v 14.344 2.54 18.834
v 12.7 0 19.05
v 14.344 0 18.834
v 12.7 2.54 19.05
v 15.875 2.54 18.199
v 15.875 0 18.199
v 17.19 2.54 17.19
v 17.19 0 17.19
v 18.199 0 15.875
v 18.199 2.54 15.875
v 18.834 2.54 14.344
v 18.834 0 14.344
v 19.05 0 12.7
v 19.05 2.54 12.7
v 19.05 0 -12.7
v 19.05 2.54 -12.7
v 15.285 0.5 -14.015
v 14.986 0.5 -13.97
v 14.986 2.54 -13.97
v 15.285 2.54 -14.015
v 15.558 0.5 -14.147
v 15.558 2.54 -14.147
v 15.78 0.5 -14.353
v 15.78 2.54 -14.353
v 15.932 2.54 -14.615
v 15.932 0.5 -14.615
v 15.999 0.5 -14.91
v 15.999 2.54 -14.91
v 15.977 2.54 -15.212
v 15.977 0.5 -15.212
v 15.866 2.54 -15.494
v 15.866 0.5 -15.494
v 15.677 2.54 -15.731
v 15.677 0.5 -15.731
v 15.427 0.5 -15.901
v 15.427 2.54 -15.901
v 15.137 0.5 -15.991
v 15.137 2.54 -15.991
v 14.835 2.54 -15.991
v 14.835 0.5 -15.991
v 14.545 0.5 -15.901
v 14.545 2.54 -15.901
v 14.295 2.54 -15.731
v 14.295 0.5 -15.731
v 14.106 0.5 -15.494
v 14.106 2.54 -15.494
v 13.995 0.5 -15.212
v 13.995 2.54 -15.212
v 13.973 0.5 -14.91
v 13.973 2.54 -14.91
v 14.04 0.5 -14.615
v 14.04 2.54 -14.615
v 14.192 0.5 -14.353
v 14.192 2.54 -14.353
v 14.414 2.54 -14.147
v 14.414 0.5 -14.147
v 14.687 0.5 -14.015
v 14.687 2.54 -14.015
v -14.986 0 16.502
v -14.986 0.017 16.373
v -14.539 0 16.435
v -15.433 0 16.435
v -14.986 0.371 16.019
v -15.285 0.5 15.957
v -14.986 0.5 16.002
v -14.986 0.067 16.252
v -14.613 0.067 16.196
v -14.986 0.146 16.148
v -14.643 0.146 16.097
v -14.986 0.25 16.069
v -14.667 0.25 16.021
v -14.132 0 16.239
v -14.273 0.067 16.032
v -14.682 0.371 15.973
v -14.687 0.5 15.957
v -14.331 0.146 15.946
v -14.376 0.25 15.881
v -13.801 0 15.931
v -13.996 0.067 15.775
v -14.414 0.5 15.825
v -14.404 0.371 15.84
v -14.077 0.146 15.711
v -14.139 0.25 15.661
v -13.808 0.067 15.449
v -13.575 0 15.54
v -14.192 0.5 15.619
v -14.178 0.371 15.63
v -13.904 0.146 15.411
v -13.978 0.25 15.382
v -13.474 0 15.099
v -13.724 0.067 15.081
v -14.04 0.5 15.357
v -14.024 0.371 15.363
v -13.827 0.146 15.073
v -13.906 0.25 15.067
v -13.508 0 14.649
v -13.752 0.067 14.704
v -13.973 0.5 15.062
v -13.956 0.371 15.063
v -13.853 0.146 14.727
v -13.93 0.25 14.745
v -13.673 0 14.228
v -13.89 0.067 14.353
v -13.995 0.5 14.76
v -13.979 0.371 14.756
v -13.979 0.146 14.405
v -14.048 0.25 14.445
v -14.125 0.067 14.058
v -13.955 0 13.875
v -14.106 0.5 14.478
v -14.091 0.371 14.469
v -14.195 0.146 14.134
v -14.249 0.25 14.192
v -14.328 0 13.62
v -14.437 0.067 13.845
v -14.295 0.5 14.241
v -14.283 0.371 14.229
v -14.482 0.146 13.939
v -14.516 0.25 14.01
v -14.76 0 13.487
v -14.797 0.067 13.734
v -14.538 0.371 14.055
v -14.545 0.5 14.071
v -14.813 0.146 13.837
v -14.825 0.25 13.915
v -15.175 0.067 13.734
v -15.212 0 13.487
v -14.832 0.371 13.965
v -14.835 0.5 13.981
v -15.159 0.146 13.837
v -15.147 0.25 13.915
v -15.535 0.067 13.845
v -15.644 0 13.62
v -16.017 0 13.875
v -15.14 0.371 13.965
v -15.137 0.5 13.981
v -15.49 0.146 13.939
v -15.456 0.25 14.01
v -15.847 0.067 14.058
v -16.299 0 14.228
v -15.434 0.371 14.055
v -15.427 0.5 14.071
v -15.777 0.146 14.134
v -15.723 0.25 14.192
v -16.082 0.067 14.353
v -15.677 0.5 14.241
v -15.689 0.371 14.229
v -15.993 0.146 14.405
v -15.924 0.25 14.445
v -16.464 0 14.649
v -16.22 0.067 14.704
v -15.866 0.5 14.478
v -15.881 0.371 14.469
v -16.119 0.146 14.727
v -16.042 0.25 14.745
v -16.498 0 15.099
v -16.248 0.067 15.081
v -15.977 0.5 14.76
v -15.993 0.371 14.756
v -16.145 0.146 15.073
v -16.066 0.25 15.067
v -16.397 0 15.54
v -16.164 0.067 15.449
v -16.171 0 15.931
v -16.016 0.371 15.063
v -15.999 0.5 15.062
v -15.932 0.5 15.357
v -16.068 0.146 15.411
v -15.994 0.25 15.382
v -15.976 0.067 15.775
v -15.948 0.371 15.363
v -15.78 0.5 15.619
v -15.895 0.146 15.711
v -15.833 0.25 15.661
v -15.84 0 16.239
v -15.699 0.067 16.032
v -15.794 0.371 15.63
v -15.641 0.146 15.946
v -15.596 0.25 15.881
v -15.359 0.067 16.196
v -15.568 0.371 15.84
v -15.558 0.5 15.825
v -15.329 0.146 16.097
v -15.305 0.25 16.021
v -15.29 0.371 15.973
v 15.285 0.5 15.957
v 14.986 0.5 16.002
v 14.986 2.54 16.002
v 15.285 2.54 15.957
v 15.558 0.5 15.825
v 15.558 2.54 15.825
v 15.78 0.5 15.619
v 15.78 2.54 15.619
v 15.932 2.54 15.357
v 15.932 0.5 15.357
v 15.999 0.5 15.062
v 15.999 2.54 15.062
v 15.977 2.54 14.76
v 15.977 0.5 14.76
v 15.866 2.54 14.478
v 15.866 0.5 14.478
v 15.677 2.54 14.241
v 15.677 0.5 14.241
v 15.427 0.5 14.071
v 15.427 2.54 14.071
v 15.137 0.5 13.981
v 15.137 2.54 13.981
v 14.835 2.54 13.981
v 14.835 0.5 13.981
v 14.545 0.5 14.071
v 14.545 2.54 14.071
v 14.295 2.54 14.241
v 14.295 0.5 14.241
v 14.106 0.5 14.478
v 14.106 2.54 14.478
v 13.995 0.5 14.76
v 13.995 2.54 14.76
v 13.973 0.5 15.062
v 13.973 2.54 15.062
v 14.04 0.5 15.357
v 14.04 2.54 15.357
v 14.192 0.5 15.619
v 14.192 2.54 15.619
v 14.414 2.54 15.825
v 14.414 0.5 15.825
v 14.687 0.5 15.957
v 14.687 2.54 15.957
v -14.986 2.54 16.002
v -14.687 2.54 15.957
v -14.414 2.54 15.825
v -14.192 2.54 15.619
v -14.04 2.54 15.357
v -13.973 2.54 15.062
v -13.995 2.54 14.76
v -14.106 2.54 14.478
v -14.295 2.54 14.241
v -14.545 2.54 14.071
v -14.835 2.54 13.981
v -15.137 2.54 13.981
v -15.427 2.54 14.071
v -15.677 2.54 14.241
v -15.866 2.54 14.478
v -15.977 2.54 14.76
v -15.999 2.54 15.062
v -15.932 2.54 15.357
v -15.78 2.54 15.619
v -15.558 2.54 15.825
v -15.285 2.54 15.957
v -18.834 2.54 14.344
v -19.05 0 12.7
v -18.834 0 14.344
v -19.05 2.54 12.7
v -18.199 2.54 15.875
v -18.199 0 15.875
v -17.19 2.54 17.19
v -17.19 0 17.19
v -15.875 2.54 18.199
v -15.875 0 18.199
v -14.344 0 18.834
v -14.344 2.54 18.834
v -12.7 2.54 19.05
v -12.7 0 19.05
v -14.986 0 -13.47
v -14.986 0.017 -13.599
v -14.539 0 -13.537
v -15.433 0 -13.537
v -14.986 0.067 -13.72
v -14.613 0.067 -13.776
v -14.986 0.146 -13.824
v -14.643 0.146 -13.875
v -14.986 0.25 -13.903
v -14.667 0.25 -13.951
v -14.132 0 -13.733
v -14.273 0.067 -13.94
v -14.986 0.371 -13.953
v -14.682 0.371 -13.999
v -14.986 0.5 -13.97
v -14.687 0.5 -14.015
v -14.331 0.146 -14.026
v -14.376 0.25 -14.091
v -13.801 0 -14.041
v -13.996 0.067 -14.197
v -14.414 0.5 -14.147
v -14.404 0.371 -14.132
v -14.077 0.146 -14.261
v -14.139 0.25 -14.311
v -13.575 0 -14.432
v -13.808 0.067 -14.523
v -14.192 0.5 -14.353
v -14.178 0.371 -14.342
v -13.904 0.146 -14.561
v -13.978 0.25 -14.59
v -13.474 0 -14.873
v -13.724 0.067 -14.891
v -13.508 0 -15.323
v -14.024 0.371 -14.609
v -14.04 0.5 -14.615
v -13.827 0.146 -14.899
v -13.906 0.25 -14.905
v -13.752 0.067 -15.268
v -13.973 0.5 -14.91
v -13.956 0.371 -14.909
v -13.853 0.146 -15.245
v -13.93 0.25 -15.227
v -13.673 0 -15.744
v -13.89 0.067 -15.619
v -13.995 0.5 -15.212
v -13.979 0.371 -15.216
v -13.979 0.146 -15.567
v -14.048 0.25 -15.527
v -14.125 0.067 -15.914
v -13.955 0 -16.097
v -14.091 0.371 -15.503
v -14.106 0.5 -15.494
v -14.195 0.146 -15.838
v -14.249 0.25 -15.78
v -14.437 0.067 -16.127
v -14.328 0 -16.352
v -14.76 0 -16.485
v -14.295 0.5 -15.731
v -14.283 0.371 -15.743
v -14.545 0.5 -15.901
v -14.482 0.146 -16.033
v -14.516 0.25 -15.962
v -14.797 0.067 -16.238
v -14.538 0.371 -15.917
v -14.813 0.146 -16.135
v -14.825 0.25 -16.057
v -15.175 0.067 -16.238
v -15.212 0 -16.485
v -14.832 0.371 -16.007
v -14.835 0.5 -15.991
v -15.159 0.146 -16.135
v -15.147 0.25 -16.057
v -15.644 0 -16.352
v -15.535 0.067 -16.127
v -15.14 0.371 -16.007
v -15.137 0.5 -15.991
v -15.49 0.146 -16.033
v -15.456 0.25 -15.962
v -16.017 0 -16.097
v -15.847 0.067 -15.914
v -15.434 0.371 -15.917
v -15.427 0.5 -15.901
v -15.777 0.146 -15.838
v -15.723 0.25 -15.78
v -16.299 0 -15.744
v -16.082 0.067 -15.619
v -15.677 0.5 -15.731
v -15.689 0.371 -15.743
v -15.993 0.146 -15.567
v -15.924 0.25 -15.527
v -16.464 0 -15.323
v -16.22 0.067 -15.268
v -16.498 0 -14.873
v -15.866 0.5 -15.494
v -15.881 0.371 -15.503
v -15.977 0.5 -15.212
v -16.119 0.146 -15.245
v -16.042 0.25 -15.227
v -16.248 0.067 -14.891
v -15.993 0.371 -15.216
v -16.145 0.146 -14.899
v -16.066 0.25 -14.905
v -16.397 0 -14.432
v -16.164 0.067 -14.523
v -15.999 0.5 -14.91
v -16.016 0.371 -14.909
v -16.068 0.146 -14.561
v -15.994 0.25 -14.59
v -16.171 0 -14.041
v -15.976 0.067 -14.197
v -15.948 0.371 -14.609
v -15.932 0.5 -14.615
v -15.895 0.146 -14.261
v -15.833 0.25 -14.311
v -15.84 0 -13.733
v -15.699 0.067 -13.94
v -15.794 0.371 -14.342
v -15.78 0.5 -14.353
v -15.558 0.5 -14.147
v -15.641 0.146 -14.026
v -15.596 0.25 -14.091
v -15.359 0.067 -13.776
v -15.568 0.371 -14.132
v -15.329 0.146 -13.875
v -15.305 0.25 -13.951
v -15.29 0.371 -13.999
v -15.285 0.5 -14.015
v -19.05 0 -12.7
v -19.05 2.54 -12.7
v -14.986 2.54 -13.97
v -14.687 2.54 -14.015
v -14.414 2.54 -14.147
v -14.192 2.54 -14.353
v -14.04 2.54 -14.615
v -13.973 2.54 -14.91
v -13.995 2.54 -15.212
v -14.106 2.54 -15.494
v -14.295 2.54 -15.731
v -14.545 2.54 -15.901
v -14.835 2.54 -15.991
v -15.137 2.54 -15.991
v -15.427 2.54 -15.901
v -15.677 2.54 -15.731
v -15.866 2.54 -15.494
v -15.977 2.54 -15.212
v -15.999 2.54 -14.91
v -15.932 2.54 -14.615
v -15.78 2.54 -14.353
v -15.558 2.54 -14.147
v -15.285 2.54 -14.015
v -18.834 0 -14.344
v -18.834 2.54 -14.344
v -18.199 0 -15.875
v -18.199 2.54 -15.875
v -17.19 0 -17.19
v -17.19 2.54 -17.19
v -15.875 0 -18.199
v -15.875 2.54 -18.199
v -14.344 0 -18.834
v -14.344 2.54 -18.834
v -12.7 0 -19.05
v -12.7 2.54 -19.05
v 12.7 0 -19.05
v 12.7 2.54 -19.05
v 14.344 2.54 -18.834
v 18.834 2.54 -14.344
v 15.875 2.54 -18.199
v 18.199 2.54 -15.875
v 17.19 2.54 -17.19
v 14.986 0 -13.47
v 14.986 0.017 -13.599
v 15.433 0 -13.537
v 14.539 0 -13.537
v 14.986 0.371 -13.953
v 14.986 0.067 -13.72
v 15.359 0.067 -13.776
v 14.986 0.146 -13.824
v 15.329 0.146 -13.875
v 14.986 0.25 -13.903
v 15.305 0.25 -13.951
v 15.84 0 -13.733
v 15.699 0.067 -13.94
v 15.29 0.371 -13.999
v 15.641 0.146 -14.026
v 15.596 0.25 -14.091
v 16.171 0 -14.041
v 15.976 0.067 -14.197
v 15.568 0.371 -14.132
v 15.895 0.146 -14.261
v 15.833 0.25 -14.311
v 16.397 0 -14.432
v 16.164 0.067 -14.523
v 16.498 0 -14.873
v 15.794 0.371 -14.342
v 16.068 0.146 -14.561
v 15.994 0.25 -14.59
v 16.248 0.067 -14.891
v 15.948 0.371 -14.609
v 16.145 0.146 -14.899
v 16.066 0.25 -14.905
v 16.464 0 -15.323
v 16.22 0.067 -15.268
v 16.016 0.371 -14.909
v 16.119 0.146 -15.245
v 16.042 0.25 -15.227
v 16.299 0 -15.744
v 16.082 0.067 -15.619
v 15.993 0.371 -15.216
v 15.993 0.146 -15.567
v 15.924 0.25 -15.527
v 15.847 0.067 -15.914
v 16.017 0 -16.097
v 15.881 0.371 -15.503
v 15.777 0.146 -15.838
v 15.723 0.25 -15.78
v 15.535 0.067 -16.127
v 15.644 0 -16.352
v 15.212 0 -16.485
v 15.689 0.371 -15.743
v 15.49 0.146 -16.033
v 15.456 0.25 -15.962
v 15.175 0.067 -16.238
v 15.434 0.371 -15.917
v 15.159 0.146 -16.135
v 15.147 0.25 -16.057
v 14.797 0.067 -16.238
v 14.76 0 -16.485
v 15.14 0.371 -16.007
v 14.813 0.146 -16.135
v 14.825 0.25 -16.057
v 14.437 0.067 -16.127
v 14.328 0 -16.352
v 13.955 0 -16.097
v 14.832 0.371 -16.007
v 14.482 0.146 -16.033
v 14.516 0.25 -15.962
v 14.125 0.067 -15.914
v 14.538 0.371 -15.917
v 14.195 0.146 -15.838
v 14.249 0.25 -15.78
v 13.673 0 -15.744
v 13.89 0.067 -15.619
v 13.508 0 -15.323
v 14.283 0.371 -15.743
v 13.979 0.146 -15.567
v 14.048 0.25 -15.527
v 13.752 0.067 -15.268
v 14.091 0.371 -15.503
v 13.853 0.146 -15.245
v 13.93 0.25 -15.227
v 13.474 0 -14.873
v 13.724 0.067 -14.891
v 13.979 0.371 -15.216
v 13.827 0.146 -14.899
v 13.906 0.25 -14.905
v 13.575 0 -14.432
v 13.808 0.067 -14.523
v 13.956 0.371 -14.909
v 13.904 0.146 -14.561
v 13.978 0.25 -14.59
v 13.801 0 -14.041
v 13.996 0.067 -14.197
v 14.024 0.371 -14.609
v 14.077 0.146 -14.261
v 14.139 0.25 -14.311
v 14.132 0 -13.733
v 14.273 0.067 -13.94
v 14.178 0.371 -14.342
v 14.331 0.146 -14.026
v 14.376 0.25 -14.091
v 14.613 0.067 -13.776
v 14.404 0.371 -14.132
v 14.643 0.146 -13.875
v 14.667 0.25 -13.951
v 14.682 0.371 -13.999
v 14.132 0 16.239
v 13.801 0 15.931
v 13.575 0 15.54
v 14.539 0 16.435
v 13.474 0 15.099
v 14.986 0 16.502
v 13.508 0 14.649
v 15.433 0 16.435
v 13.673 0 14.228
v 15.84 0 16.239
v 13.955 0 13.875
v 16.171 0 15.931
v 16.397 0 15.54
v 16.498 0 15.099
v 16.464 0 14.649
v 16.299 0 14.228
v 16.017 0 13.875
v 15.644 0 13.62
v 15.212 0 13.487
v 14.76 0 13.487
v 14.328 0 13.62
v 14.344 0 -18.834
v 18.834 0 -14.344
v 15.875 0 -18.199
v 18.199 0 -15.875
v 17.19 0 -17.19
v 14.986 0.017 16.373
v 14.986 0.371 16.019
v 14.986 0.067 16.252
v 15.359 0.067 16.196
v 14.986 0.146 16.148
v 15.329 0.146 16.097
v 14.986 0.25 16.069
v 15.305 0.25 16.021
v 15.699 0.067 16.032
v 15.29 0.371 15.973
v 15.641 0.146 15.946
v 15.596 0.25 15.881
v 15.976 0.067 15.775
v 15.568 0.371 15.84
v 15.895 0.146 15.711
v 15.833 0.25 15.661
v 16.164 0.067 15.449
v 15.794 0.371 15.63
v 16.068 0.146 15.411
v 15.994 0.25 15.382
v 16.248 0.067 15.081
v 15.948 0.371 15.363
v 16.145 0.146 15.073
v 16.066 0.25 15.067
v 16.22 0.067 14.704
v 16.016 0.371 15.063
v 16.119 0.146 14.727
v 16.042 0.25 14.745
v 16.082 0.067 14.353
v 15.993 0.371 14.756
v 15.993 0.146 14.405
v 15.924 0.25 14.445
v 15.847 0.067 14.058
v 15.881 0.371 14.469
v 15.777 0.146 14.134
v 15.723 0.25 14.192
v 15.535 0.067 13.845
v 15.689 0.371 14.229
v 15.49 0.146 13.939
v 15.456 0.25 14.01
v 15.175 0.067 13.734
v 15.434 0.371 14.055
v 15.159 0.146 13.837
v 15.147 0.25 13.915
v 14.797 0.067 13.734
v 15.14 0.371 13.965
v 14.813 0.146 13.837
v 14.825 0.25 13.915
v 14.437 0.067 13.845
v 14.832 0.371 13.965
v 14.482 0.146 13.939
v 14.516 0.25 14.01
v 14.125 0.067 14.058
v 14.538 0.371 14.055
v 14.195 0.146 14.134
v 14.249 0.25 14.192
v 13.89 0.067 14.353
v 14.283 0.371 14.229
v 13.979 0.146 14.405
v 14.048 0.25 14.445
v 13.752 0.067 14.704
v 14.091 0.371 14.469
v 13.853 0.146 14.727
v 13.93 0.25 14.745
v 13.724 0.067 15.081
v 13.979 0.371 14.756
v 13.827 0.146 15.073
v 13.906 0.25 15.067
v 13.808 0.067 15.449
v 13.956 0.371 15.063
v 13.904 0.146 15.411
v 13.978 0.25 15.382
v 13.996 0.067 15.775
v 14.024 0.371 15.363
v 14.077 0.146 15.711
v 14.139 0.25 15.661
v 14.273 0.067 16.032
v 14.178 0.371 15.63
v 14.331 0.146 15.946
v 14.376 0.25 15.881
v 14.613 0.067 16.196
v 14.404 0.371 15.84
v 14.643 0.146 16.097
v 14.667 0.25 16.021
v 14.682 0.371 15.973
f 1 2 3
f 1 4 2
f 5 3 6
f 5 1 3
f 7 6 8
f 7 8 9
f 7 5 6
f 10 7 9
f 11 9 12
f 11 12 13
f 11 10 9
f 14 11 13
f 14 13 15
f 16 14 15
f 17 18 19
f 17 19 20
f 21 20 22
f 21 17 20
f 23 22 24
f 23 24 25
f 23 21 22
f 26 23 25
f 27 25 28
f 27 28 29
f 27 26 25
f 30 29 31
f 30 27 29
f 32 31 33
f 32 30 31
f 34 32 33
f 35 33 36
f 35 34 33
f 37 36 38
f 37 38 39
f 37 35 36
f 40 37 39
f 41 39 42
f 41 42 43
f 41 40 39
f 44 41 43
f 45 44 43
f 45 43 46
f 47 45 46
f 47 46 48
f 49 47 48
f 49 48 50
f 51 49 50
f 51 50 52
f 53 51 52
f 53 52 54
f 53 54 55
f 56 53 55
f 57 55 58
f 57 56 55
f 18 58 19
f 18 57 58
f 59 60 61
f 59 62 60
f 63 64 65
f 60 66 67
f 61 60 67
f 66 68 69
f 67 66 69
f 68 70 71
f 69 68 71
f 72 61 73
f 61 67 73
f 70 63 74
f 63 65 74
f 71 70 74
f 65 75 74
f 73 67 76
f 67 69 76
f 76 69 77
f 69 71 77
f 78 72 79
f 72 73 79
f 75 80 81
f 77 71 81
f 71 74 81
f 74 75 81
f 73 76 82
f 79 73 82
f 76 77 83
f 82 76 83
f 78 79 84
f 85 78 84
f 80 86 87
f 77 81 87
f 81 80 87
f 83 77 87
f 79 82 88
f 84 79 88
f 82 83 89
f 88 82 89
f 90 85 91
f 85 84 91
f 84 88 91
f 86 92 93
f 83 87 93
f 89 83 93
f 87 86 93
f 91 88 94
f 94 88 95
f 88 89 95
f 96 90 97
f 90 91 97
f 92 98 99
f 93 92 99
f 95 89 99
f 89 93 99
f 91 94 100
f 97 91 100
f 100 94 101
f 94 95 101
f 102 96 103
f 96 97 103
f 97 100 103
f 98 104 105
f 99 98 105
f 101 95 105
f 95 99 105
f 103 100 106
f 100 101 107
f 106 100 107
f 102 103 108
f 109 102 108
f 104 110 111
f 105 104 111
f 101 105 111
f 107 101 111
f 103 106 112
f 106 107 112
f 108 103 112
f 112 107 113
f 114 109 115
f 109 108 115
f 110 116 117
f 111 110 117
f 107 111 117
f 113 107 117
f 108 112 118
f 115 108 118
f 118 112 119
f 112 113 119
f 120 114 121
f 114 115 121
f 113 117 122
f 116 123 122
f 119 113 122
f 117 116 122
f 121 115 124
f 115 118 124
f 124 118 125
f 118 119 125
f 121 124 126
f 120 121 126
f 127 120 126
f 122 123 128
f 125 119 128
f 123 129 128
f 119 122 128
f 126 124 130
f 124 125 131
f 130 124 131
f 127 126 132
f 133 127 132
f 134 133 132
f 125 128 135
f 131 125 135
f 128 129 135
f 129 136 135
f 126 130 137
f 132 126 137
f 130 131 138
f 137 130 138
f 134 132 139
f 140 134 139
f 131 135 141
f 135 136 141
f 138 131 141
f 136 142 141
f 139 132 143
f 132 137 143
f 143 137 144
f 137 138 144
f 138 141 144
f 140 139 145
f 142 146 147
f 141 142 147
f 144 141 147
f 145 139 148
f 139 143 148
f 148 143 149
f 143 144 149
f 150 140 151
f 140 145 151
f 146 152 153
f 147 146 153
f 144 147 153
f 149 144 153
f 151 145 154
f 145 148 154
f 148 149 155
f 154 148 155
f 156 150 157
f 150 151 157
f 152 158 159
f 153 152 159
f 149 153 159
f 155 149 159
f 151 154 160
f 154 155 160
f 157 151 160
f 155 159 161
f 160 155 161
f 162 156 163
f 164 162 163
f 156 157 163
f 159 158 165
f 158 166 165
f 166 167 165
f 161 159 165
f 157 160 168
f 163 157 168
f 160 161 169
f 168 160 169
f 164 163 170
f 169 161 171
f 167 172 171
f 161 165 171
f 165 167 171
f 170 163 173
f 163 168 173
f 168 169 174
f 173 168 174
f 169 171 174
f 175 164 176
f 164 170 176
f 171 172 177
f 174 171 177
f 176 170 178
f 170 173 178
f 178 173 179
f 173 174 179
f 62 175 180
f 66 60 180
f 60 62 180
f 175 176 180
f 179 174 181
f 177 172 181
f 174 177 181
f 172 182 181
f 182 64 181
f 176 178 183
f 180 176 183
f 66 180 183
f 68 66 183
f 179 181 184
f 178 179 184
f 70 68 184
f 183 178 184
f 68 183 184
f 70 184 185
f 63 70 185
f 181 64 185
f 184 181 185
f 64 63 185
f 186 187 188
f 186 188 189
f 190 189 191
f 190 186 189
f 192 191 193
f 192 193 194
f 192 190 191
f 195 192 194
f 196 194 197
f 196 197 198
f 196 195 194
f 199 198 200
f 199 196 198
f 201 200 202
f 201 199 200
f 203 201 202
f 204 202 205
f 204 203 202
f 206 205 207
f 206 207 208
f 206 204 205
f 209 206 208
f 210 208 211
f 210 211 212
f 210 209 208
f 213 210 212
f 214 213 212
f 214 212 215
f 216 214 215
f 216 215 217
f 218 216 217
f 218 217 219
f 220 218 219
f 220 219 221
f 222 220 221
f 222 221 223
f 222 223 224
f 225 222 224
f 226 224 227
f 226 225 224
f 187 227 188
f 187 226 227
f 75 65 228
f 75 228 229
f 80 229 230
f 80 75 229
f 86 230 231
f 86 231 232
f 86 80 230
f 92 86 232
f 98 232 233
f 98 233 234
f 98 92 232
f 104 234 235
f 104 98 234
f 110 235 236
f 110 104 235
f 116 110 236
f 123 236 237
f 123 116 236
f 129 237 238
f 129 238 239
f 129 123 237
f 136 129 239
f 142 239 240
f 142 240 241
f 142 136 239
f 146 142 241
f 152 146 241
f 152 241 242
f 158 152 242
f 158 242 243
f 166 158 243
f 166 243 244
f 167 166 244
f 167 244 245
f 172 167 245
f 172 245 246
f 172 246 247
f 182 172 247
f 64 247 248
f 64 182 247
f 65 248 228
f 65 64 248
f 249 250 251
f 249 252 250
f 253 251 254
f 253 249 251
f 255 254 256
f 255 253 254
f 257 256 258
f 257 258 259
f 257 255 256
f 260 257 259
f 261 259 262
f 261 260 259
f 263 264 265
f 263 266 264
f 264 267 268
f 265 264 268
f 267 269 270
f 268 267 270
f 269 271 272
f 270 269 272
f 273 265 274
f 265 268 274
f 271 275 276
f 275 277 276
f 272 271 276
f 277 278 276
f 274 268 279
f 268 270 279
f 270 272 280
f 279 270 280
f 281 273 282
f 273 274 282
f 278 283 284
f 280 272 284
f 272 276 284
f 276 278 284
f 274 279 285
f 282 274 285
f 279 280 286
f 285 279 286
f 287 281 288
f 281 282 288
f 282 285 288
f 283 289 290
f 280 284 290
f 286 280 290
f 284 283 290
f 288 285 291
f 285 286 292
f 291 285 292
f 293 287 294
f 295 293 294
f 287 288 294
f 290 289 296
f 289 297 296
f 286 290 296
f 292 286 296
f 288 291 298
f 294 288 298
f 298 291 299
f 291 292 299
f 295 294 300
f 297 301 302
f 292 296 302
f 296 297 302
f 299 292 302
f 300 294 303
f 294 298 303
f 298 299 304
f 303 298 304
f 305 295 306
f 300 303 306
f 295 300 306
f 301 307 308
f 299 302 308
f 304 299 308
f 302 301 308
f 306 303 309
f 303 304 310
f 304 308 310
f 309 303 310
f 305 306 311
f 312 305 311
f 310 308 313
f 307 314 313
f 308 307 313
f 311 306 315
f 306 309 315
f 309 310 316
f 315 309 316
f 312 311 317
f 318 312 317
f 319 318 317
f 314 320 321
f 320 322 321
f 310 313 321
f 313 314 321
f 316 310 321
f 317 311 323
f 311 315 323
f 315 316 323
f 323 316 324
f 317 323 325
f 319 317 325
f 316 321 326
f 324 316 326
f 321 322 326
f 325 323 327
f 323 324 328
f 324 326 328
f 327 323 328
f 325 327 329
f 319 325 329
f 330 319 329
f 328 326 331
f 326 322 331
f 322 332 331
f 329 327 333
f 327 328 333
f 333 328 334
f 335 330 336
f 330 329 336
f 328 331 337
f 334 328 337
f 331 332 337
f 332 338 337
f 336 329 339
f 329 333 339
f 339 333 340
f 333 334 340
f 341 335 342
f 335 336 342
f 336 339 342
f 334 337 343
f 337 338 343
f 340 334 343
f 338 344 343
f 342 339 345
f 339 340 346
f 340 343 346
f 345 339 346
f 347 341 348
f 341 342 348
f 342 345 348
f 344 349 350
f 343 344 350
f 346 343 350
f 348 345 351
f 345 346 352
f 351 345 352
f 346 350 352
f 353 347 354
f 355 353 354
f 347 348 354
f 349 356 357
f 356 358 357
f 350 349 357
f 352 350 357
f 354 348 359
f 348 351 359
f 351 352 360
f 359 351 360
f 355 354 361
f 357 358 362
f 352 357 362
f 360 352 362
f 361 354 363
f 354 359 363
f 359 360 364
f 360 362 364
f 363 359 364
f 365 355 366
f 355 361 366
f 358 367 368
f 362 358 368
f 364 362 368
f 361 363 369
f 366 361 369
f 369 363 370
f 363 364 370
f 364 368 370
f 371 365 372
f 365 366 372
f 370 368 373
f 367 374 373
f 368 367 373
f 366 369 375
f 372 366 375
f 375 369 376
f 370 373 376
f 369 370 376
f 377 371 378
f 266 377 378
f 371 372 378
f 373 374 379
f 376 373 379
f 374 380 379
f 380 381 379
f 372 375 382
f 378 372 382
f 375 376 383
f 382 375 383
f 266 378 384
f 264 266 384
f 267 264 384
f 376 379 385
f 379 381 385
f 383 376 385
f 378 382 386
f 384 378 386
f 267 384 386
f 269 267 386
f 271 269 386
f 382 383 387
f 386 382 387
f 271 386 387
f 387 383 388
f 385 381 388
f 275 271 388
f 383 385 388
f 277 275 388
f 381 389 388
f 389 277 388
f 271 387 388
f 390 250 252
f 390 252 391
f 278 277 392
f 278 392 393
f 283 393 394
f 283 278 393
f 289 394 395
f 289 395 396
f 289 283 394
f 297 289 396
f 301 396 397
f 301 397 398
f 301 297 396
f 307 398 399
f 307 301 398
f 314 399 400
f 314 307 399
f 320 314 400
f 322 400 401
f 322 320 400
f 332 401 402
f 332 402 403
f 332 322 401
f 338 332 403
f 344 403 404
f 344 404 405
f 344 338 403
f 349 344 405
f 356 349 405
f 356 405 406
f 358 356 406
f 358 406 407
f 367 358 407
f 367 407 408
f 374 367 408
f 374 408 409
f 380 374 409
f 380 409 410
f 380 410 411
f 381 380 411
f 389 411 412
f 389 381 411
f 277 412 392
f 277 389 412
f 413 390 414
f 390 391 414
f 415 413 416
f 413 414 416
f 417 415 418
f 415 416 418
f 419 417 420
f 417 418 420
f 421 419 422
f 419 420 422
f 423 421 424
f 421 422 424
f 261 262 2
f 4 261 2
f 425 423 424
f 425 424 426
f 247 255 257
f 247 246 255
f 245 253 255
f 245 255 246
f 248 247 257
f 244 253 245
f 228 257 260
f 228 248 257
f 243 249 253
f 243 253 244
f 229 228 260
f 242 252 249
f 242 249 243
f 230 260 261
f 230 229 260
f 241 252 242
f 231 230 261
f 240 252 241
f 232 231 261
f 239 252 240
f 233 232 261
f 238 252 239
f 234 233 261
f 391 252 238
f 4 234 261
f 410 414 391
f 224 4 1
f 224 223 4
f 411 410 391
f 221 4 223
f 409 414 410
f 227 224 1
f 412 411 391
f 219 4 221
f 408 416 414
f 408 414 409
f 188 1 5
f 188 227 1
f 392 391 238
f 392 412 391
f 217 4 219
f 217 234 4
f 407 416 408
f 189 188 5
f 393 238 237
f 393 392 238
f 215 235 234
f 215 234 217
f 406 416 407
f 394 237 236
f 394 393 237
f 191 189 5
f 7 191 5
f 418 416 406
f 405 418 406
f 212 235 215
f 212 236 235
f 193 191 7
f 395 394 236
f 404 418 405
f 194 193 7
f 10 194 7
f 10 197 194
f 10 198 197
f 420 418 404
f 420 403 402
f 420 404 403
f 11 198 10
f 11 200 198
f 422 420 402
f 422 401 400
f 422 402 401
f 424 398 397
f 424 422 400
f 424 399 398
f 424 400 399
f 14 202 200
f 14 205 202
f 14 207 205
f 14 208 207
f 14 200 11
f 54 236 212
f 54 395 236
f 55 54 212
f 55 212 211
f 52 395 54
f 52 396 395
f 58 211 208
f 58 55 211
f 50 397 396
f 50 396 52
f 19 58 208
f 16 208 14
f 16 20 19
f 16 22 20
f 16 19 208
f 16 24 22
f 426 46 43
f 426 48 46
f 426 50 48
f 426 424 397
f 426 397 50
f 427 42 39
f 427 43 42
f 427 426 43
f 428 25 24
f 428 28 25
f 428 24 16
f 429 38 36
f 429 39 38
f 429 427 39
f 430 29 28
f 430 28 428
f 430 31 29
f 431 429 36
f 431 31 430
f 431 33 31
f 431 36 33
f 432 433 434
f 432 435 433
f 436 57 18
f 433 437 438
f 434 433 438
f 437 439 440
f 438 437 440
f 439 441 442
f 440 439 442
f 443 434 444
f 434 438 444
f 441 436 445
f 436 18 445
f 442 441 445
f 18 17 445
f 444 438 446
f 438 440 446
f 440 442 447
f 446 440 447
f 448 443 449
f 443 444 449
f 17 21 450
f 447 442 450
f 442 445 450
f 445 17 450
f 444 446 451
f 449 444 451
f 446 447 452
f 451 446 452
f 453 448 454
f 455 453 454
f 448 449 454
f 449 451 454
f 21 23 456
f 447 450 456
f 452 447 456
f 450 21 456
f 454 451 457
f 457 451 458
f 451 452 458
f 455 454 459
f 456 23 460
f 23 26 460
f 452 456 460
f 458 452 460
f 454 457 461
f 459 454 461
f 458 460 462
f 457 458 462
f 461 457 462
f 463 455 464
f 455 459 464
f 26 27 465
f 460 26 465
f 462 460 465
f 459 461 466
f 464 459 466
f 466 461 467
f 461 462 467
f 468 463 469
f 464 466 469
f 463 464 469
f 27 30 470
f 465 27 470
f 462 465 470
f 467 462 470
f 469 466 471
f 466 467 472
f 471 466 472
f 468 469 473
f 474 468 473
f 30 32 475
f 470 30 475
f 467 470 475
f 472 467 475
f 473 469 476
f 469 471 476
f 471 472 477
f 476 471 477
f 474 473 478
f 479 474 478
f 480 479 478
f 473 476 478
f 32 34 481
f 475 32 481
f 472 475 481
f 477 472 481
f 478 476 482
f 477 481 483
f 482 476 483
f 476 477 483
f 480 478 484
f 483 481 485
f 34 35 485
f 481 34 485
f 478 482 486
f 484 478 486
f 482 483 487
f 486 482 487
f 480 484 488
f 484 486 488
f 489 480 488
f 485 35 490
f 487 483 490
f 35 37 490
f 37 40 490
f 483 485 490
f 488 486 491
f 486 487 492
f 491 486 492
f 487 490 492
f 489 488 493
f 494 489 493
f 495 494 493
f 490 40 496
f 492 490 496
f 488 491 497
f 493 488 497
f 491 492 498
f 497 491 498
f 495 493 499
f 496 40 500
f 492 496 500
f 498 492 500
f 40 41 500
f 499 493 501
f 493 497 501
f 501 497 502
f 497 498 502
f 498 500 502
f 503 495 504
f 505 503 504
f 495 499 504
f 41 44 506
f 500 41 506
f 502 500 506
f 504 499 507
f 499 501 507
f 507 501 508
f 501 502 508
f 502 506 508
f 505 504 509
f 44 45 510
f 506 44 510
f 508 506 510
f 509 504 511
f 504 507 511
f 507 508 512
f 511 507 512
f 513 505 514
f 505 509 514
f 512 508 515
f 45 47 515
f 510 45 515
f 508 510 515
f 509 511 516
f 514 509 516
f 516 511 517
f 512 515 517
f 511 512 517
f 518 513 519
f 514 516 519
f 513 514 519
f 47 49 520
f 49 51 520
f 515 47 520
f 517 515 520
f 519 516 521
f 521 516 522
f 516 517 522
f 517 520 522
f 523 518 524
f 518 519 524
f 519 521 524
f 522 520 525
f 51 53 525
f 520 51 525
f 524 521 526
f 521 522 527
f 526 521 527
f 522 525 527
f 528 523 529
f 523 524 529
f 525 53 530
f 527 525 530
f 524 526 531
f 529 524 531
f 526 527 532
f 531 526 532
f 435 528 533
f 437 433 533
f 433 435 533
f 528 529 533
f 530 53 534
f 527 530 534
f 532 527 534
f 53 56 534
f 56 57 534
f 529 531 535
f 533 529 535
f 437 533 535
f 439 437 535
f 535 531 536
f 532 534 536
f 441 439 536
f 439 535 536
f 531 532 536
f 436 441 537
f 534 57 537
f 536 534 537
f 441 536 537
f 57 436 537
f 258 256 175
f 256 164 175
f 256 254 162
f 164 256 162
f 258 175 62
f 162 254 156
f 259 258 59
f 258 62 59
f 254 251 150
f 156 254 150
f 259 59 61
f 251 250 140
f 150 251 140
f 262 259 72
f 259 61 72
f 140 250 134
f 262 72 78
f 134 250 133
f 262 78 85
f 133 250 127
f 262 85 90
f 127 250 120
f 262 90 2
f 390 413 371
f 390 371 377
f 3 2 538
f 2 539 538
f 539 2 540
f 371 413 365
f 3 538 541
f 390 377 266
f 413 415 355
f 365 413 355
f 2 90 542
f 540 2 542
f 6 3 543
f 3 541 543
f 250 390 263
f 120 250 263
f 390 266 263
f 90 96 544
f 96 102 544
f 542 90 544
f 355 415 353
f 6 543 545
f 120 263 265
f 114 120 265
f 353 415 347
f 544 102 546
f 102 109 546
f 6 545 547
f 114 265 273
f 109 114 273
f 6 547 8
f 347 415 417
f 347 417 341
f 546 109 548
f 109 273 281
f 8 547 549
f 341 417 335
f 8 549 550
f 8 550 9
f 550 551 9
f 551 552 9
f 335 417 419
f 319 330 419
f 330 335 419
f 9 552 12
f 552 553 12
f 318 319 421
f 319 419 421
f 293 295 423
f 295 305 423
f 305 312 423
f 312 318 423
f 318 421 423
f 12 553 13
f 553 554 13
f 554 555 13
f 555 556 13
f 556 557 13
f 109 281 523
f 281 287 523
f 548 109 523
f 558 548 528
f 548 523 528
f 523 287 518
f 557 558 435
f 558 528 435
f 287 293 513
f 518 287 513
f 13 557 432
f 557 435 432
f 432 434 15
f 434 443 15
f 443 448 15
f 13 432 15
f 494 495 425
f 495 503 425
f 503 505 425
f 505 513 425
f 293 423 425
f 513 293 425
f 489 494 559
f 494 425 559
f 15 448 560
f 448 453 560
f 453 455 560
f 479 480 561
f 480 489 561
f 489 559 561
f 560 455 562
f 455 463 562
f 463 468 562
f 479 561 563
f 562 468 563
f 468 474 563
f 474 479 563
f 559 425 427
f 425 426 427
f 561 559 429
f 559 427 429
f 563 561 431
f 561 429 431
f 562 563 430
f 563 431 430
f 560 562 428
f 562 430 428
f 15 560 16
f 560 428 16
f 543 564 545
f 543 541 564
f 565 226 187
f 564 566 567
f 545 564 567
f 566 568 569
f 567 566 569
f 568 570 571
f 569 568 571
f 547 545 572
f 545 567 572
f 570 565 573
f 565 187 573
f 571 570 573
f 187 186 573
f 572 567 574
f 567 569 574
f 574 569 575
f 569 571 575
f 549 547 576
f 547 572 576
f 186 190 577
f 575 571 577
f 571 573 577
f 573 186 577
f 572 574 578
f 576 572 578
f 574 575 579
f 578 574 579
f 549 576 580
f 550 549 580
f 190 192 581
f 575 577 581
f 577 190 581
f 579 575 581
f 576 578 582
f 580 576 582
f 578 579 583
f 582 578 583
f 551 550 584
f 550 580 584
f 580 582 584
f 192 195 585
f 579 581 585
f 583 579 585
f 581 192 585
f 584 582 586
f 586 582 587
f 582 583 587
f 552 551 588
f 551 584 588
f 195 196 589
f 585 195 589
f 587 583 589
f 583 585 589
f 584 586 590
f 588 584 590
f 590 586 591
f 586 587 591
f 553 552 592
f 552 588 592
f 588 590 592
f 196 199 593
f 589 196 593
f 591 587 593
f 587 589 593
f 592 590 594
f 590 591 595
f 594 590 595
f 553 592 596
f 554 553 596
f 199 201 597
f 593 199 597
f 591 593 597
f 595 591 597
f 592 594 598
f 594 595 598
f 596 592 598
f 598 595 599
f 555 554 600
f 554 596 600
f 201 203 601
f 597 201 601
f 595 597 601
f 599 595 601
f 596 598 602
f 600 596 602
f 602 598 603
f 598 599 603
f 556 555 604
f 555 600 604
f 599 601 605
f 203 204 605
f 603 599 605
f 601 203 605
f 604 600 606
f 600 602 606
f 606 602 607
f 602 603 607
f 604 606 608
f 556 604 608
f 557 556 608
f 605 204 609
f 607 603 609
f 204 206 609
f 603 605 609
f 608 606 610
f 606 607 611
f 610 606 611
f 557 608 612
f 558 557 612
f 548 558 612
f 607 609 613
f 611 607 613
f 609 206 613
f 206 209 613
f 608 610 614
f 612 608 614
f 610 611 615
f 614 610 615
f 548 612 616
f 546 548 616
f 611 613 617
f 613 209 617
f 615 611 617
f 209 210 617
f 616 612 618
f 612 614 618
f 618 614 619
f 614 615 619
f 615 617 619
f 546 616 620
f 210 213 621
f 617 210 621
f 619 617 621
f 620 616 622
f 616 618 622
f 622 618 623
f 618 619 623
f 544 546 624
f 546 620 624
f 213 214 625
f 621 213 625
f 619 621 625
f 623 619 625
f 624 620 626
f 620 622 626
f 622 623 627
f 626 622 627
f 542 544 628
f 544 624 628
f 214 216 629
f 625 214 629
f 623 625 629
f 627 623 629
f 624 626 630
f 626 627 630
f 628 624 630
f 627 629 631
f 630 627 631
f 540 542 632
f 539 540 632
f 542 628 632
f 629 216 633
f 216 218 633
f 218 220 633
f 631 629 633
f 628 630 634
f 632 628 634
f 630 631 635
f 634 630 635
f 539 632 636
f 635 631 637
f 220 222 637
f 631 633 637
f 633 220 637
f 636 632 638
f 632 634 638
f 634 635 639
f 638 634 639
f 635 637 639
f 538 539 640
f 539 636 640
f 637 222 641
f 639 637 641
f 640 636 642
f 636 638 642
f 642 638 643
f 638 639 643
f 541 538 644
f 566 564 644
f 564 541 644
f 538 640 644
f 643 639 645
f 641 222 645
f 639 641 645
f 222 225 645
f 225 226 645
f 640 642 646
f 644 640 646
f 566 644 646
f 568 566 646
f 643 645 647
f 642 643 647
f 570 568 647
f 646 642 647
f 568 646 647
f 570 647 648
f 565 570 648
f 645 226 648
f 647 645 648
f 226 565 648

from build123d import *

# Parameters (mm, degrees)
SKETCH1_W           = 38.1
SKETCH1_H           = 38.1
SKETCH1_R           = 1.016
BOSS_EXTRUDE1_DEPTH = 2.54
FILLET1_R           = 6.35
FILLET2_R           = 0.5


with BuildPart() as part:
    # Sketch1 → Boss-Extrude1 (new body)
    with BuildSketch(Plane(origin=(0, 0, 0), x_dir=(1, 0, 0), z_dir=(0, 1, 0))):
        Rectangle(SKETCH1_W, SKETCH1_H)
        with Locations(Location((-14.986, 14.986, 0), (0, 0, 270))):
            Circle(SKETCH1_R, mode=Mode.SUBTRACT)
        with Locations(Location((-14.986, -14.986, 0), (0, 0, 270))):
            Circle(SKETCH1_R, mode=Mode.SUBTRACT)
        with Locations(Location((14.986, -14.986, 0), (0, 0, 270))):
            Circle(SKETCH1_R, mode=Mode.SUBTRACT)
        with Locations(Location((14.986, 14.986, 0), (0, 0, 270))):
            Circle(SKETCH1_R, mode=Mode.SUBTRACT)
    extrude(amount=BOSS_EXTRUDE1_DEPTH)

    # Fillet1
    fillet1_edges = [part.edges().sort_by_distance(p)[0] for p in [
        (-19.05, 1.27, -19.05),
        (19.05, 1.27, -19.05),
        (19.05, 1.27, 19.05),
        (-19.05, 1.27, 19.05),
    ]]
    fillet(fillet1_edges, radius=FILLET1_R)

    # Fillet2
    fillet2_edges = [part.edges().sort_by_distance(p)[0] for p in [
        (-14.986, 0, -16.002),
        (-14.986, 0, 13.97),
        (14.986, 0, 13.97),
        (14.986, 0, -16.002),
    ]]
    fillet(fillet2_edges, radius=FILLET2_R)


solid = part.part
